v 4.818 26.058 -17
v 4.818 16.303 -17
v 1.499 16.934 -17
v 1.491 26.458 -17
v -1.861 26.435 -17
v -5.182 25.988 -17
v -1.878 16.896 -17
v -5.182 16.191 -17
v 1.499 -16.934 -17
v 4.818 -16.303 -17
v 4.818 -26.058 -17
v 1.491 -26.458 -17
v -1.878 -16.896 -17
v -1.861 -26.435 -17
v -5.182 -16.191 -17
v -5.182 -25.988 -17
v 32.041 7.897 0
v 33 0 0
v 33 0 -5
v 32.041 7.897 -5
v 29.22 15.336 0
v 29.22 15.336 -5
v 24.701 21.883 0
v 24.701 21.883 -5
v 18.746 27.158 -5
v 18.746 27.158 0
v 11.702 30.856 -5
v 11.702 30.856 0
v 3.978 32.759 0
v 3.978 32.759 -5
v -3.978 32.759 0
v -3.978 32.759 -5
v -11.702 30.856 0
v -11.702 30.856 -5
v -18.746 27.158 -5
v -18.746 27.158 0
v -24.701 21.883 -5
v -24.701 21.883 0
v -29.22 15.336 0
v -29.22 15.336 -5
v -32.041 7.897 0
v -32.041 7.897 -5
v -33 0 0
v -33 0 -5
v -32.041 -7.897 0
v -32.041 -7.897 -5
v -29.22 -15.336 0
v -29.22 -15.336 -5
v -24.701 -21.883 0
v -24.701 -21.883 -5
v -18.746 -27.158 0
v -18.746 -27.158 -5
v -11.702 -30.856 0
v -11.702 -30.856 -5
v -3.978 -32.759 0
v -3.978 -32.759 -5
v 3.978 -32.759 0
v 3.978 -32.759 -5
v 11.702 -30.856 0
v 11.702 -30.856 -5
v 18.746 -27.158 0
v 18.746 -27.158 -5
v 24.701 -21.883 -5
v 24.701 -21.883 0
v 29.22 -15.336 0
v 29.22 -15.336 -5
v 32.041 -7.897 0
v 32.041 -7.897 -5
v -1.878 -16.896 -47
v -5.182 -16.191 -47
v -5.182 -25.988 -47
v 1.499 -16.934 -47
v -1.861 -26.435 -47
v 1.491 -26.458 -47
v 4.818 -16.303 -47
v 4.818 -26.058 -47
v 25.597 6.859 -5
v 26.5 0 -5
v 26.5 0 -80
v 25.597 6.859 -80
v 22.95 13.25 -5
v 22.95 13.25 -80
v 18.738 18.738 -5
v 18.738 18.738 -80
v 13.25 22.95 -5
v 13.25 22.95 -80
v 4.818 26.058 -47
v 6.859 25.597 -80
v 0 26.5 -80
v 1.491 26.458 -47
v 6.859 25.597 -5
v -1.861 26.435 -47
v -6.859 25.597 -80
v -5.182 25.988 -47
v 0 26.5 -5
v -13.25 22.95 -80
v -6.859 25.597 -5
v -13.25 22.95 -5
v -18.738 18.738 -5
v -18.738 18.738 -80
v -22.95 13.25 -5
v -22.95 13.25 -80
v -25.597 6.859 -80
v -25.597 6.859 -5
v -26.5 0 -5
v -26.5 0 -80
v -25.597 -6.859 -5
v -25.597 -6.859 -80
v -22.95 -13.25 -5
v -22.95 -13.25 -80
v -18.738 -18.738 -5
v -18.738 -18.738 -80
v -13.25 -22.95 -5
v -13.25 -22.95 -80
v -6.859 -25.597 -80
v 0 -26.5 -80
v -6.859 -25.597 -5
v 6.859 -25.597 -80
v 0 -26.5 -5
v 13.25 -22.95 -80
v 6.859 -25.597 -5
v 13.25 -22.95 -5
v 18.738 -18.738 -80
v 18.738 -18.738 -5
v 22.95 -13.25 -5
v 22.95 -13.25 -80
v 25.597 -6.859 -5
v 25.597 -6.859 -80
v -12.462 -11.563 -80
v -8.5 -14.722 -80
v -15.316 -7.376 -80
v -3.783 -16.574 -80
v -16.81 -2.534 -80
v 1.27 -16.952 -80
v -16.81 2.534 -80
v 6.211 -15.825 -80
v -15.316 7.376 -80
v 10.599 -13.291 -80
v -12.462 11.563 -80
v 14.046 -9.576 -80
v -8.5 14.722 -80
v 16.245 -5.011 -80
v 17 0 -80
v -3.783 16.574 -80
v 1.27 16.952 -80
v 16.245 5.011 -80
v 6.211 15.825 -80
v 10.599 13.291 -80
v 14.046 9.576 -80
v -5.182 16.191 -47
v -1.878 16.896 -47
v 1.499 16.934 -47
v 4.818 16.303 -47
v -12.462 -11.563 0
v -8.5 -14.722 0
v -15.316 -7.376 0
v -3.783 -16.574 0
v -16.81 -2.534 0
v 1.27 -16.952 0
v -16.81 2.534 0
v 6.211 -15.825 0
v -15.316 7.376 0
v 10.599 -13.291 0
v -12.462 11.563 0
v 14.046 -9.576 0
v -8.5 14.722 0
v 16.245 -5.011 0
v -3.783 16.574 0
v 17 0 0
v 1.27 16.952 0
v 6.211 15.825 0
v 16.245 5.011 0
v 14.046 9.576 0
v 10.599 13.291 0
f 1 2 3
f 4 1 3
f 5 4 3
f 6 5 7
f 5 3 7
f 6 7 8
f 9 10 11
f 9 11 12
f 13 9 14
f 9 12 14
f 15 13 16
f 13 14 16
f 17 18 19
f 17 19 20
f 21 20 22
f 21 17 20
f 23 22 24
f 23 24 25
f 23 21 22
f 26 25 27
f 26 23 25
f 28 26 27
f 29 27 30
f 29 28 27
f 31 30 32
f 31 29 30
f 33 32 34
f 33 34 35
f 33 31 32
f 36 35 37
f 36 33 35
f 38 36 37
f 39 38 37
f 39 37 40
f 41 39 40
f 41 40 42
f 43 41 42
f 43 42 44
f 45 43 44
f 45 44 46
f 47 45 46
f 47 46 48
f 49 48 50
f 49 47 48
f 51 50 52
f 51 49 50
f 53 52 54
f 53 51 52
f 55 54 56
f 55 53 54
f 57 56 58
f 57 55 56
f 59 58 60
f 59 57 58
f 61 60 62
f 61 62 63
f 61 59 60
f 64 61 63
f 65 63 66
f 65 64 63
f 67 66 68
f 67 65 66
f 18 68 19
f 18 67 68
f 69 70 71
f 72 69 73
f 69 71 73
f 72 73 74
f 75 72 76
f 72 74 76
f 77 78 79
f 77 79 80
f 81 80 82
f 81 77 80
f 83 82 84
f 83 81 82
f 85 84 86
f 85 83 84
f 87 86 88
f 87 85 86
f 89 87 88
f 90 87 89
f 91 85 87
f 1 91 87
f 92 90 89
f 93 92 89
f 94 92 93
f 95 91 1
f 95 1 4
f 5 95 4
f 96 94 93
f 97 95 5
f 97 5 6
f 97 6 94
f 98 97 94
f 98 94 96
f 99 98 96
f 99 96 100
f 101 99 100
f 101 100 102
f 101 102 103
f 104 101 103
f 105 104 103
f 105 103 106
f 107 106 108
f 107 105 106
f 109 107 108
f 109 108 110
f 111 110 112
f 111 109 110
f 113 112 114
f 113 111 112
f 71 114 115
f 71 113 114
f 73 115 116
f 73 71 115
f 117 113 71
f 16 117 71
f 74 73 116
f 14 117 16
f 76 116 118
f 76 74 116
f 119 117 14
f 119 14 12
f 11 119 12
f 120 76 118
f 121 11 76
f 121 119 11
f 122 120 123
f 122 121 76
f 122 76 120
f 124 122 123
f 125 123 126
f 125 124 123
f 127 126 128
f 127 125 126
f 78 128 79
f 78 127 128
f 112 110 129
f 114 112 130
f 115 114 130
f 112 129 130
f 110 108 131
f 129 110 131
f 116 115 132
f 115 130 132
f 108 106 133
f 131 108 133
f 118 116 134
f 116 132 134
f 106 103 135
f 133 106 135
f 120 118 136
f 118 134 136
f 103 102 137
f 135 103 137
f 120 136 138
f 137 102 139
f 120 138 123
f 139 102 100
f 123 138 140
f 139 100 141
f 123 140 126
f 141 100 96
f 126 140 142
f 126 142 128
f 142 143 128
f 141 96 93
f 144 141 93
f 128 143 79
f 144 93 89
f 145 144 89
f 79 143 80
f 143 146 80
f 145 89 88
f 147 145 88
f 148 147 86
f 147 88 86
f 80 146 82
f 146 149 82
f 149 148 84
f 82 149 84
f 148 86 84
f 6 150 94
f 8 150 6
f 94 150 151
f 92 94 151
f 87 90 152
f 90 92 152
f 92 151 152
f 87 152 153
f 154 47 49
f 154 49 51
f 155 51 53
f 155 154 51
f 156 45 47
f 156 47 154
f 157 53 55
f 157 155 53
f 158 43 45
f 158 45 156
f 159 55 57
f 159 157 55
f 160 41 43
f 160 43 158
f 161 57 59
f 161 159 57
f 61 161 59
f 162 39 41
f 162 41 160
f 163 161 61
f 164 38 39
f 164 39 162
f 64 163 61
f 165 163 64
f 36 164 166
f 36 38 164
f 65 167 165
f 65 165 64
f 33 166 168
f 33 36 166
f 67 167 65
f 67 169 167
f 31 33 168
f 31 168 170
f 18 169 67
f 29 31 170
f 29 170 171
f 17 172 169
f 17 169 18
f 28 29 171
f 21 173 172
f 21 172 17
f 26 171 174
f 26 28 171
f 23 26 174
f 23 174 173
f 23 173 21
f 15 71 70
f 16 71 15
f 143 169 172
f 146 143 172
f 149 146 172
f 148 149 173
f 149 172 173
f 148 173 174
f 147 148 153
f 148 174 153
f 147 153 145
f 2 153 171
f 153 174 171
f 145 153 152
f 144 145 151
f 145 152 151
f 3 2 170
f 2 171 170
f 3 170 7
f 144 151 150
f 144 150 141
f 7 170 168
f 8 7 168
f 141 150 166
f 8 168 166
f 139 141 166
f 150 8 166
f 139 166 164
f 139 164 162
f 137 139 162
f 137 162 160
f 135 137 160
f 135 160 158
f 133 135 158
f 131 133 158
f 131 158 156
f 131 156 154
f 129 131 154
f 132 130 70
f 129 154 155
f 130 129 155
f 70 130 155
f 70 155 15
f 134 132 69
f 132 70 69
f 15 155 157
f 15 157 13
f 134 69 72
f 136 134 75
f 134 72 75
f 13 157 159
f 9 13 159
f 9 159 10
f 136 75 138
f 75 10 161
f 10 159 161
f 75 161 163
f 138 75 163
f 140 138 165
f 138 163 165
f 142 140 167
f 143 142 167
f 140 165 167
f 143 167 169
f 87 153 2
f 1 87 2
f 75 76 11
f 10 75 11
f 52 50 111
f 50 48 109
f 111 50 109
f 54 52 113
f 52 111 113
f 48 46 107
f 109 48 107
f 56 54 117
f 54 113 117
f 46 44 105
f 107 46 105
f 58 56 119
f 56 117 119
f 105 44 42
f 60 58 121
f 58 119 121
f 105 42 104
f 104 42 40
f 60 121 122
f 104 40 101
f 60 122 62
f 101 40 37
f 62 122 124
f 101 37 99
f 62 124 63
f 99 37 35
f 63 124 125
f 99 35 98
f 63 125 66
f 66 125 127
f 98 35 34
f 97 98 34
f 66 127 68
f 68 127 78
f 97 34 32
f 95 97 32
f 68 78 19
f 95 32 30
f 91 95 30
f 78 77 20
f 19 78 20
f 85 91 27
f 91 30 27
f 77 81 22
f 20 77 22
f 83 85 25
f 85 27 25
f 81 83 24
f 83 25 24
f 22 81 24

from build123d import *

# Parameters (mm, degrees)
F0_R     = 33
F0_R_2   = 26.5
F1_DEPTH = 5
F0_R_3   = 17
F2_DEPTH = 80
F3_W     = 4.817946
F3_H     = 30
F3_W_2   = 5.182054
F4_DEPTH = 50


with BuildPart() as f1:
    # F0 (on Top) → F1 (new body)
    with BuildSketch(Plane.XY):
        Circle(F0_R)
        Circle(F0_R_2, mode=Mode.SUBTRACT)
    extrude(amount=-F1_DEPTH)

    # F0 (on Top) → F2 (join)
    with BuildSketch(Plane.XY):
        Circle(F0_R_2)
        Circle(F0_R_3, mode=Mode.SUBTRACT)
    extrude(amount=-F2_DEPTH)

    # F3 (on Front) → F4 (cut, symmetric)
    with BuildSketch(Plane.XZ):
        with Locations((2.408973, -32)):
            Rectangle(F3_W, F3_H)
        with Locations((-2.591027, -32)):
            Rectangle(F3_W_2, F3_H)
    extrude(amount=F4_DEPTH, both=True, mode=Mode.SUBTRACT)


solid = f1.part
